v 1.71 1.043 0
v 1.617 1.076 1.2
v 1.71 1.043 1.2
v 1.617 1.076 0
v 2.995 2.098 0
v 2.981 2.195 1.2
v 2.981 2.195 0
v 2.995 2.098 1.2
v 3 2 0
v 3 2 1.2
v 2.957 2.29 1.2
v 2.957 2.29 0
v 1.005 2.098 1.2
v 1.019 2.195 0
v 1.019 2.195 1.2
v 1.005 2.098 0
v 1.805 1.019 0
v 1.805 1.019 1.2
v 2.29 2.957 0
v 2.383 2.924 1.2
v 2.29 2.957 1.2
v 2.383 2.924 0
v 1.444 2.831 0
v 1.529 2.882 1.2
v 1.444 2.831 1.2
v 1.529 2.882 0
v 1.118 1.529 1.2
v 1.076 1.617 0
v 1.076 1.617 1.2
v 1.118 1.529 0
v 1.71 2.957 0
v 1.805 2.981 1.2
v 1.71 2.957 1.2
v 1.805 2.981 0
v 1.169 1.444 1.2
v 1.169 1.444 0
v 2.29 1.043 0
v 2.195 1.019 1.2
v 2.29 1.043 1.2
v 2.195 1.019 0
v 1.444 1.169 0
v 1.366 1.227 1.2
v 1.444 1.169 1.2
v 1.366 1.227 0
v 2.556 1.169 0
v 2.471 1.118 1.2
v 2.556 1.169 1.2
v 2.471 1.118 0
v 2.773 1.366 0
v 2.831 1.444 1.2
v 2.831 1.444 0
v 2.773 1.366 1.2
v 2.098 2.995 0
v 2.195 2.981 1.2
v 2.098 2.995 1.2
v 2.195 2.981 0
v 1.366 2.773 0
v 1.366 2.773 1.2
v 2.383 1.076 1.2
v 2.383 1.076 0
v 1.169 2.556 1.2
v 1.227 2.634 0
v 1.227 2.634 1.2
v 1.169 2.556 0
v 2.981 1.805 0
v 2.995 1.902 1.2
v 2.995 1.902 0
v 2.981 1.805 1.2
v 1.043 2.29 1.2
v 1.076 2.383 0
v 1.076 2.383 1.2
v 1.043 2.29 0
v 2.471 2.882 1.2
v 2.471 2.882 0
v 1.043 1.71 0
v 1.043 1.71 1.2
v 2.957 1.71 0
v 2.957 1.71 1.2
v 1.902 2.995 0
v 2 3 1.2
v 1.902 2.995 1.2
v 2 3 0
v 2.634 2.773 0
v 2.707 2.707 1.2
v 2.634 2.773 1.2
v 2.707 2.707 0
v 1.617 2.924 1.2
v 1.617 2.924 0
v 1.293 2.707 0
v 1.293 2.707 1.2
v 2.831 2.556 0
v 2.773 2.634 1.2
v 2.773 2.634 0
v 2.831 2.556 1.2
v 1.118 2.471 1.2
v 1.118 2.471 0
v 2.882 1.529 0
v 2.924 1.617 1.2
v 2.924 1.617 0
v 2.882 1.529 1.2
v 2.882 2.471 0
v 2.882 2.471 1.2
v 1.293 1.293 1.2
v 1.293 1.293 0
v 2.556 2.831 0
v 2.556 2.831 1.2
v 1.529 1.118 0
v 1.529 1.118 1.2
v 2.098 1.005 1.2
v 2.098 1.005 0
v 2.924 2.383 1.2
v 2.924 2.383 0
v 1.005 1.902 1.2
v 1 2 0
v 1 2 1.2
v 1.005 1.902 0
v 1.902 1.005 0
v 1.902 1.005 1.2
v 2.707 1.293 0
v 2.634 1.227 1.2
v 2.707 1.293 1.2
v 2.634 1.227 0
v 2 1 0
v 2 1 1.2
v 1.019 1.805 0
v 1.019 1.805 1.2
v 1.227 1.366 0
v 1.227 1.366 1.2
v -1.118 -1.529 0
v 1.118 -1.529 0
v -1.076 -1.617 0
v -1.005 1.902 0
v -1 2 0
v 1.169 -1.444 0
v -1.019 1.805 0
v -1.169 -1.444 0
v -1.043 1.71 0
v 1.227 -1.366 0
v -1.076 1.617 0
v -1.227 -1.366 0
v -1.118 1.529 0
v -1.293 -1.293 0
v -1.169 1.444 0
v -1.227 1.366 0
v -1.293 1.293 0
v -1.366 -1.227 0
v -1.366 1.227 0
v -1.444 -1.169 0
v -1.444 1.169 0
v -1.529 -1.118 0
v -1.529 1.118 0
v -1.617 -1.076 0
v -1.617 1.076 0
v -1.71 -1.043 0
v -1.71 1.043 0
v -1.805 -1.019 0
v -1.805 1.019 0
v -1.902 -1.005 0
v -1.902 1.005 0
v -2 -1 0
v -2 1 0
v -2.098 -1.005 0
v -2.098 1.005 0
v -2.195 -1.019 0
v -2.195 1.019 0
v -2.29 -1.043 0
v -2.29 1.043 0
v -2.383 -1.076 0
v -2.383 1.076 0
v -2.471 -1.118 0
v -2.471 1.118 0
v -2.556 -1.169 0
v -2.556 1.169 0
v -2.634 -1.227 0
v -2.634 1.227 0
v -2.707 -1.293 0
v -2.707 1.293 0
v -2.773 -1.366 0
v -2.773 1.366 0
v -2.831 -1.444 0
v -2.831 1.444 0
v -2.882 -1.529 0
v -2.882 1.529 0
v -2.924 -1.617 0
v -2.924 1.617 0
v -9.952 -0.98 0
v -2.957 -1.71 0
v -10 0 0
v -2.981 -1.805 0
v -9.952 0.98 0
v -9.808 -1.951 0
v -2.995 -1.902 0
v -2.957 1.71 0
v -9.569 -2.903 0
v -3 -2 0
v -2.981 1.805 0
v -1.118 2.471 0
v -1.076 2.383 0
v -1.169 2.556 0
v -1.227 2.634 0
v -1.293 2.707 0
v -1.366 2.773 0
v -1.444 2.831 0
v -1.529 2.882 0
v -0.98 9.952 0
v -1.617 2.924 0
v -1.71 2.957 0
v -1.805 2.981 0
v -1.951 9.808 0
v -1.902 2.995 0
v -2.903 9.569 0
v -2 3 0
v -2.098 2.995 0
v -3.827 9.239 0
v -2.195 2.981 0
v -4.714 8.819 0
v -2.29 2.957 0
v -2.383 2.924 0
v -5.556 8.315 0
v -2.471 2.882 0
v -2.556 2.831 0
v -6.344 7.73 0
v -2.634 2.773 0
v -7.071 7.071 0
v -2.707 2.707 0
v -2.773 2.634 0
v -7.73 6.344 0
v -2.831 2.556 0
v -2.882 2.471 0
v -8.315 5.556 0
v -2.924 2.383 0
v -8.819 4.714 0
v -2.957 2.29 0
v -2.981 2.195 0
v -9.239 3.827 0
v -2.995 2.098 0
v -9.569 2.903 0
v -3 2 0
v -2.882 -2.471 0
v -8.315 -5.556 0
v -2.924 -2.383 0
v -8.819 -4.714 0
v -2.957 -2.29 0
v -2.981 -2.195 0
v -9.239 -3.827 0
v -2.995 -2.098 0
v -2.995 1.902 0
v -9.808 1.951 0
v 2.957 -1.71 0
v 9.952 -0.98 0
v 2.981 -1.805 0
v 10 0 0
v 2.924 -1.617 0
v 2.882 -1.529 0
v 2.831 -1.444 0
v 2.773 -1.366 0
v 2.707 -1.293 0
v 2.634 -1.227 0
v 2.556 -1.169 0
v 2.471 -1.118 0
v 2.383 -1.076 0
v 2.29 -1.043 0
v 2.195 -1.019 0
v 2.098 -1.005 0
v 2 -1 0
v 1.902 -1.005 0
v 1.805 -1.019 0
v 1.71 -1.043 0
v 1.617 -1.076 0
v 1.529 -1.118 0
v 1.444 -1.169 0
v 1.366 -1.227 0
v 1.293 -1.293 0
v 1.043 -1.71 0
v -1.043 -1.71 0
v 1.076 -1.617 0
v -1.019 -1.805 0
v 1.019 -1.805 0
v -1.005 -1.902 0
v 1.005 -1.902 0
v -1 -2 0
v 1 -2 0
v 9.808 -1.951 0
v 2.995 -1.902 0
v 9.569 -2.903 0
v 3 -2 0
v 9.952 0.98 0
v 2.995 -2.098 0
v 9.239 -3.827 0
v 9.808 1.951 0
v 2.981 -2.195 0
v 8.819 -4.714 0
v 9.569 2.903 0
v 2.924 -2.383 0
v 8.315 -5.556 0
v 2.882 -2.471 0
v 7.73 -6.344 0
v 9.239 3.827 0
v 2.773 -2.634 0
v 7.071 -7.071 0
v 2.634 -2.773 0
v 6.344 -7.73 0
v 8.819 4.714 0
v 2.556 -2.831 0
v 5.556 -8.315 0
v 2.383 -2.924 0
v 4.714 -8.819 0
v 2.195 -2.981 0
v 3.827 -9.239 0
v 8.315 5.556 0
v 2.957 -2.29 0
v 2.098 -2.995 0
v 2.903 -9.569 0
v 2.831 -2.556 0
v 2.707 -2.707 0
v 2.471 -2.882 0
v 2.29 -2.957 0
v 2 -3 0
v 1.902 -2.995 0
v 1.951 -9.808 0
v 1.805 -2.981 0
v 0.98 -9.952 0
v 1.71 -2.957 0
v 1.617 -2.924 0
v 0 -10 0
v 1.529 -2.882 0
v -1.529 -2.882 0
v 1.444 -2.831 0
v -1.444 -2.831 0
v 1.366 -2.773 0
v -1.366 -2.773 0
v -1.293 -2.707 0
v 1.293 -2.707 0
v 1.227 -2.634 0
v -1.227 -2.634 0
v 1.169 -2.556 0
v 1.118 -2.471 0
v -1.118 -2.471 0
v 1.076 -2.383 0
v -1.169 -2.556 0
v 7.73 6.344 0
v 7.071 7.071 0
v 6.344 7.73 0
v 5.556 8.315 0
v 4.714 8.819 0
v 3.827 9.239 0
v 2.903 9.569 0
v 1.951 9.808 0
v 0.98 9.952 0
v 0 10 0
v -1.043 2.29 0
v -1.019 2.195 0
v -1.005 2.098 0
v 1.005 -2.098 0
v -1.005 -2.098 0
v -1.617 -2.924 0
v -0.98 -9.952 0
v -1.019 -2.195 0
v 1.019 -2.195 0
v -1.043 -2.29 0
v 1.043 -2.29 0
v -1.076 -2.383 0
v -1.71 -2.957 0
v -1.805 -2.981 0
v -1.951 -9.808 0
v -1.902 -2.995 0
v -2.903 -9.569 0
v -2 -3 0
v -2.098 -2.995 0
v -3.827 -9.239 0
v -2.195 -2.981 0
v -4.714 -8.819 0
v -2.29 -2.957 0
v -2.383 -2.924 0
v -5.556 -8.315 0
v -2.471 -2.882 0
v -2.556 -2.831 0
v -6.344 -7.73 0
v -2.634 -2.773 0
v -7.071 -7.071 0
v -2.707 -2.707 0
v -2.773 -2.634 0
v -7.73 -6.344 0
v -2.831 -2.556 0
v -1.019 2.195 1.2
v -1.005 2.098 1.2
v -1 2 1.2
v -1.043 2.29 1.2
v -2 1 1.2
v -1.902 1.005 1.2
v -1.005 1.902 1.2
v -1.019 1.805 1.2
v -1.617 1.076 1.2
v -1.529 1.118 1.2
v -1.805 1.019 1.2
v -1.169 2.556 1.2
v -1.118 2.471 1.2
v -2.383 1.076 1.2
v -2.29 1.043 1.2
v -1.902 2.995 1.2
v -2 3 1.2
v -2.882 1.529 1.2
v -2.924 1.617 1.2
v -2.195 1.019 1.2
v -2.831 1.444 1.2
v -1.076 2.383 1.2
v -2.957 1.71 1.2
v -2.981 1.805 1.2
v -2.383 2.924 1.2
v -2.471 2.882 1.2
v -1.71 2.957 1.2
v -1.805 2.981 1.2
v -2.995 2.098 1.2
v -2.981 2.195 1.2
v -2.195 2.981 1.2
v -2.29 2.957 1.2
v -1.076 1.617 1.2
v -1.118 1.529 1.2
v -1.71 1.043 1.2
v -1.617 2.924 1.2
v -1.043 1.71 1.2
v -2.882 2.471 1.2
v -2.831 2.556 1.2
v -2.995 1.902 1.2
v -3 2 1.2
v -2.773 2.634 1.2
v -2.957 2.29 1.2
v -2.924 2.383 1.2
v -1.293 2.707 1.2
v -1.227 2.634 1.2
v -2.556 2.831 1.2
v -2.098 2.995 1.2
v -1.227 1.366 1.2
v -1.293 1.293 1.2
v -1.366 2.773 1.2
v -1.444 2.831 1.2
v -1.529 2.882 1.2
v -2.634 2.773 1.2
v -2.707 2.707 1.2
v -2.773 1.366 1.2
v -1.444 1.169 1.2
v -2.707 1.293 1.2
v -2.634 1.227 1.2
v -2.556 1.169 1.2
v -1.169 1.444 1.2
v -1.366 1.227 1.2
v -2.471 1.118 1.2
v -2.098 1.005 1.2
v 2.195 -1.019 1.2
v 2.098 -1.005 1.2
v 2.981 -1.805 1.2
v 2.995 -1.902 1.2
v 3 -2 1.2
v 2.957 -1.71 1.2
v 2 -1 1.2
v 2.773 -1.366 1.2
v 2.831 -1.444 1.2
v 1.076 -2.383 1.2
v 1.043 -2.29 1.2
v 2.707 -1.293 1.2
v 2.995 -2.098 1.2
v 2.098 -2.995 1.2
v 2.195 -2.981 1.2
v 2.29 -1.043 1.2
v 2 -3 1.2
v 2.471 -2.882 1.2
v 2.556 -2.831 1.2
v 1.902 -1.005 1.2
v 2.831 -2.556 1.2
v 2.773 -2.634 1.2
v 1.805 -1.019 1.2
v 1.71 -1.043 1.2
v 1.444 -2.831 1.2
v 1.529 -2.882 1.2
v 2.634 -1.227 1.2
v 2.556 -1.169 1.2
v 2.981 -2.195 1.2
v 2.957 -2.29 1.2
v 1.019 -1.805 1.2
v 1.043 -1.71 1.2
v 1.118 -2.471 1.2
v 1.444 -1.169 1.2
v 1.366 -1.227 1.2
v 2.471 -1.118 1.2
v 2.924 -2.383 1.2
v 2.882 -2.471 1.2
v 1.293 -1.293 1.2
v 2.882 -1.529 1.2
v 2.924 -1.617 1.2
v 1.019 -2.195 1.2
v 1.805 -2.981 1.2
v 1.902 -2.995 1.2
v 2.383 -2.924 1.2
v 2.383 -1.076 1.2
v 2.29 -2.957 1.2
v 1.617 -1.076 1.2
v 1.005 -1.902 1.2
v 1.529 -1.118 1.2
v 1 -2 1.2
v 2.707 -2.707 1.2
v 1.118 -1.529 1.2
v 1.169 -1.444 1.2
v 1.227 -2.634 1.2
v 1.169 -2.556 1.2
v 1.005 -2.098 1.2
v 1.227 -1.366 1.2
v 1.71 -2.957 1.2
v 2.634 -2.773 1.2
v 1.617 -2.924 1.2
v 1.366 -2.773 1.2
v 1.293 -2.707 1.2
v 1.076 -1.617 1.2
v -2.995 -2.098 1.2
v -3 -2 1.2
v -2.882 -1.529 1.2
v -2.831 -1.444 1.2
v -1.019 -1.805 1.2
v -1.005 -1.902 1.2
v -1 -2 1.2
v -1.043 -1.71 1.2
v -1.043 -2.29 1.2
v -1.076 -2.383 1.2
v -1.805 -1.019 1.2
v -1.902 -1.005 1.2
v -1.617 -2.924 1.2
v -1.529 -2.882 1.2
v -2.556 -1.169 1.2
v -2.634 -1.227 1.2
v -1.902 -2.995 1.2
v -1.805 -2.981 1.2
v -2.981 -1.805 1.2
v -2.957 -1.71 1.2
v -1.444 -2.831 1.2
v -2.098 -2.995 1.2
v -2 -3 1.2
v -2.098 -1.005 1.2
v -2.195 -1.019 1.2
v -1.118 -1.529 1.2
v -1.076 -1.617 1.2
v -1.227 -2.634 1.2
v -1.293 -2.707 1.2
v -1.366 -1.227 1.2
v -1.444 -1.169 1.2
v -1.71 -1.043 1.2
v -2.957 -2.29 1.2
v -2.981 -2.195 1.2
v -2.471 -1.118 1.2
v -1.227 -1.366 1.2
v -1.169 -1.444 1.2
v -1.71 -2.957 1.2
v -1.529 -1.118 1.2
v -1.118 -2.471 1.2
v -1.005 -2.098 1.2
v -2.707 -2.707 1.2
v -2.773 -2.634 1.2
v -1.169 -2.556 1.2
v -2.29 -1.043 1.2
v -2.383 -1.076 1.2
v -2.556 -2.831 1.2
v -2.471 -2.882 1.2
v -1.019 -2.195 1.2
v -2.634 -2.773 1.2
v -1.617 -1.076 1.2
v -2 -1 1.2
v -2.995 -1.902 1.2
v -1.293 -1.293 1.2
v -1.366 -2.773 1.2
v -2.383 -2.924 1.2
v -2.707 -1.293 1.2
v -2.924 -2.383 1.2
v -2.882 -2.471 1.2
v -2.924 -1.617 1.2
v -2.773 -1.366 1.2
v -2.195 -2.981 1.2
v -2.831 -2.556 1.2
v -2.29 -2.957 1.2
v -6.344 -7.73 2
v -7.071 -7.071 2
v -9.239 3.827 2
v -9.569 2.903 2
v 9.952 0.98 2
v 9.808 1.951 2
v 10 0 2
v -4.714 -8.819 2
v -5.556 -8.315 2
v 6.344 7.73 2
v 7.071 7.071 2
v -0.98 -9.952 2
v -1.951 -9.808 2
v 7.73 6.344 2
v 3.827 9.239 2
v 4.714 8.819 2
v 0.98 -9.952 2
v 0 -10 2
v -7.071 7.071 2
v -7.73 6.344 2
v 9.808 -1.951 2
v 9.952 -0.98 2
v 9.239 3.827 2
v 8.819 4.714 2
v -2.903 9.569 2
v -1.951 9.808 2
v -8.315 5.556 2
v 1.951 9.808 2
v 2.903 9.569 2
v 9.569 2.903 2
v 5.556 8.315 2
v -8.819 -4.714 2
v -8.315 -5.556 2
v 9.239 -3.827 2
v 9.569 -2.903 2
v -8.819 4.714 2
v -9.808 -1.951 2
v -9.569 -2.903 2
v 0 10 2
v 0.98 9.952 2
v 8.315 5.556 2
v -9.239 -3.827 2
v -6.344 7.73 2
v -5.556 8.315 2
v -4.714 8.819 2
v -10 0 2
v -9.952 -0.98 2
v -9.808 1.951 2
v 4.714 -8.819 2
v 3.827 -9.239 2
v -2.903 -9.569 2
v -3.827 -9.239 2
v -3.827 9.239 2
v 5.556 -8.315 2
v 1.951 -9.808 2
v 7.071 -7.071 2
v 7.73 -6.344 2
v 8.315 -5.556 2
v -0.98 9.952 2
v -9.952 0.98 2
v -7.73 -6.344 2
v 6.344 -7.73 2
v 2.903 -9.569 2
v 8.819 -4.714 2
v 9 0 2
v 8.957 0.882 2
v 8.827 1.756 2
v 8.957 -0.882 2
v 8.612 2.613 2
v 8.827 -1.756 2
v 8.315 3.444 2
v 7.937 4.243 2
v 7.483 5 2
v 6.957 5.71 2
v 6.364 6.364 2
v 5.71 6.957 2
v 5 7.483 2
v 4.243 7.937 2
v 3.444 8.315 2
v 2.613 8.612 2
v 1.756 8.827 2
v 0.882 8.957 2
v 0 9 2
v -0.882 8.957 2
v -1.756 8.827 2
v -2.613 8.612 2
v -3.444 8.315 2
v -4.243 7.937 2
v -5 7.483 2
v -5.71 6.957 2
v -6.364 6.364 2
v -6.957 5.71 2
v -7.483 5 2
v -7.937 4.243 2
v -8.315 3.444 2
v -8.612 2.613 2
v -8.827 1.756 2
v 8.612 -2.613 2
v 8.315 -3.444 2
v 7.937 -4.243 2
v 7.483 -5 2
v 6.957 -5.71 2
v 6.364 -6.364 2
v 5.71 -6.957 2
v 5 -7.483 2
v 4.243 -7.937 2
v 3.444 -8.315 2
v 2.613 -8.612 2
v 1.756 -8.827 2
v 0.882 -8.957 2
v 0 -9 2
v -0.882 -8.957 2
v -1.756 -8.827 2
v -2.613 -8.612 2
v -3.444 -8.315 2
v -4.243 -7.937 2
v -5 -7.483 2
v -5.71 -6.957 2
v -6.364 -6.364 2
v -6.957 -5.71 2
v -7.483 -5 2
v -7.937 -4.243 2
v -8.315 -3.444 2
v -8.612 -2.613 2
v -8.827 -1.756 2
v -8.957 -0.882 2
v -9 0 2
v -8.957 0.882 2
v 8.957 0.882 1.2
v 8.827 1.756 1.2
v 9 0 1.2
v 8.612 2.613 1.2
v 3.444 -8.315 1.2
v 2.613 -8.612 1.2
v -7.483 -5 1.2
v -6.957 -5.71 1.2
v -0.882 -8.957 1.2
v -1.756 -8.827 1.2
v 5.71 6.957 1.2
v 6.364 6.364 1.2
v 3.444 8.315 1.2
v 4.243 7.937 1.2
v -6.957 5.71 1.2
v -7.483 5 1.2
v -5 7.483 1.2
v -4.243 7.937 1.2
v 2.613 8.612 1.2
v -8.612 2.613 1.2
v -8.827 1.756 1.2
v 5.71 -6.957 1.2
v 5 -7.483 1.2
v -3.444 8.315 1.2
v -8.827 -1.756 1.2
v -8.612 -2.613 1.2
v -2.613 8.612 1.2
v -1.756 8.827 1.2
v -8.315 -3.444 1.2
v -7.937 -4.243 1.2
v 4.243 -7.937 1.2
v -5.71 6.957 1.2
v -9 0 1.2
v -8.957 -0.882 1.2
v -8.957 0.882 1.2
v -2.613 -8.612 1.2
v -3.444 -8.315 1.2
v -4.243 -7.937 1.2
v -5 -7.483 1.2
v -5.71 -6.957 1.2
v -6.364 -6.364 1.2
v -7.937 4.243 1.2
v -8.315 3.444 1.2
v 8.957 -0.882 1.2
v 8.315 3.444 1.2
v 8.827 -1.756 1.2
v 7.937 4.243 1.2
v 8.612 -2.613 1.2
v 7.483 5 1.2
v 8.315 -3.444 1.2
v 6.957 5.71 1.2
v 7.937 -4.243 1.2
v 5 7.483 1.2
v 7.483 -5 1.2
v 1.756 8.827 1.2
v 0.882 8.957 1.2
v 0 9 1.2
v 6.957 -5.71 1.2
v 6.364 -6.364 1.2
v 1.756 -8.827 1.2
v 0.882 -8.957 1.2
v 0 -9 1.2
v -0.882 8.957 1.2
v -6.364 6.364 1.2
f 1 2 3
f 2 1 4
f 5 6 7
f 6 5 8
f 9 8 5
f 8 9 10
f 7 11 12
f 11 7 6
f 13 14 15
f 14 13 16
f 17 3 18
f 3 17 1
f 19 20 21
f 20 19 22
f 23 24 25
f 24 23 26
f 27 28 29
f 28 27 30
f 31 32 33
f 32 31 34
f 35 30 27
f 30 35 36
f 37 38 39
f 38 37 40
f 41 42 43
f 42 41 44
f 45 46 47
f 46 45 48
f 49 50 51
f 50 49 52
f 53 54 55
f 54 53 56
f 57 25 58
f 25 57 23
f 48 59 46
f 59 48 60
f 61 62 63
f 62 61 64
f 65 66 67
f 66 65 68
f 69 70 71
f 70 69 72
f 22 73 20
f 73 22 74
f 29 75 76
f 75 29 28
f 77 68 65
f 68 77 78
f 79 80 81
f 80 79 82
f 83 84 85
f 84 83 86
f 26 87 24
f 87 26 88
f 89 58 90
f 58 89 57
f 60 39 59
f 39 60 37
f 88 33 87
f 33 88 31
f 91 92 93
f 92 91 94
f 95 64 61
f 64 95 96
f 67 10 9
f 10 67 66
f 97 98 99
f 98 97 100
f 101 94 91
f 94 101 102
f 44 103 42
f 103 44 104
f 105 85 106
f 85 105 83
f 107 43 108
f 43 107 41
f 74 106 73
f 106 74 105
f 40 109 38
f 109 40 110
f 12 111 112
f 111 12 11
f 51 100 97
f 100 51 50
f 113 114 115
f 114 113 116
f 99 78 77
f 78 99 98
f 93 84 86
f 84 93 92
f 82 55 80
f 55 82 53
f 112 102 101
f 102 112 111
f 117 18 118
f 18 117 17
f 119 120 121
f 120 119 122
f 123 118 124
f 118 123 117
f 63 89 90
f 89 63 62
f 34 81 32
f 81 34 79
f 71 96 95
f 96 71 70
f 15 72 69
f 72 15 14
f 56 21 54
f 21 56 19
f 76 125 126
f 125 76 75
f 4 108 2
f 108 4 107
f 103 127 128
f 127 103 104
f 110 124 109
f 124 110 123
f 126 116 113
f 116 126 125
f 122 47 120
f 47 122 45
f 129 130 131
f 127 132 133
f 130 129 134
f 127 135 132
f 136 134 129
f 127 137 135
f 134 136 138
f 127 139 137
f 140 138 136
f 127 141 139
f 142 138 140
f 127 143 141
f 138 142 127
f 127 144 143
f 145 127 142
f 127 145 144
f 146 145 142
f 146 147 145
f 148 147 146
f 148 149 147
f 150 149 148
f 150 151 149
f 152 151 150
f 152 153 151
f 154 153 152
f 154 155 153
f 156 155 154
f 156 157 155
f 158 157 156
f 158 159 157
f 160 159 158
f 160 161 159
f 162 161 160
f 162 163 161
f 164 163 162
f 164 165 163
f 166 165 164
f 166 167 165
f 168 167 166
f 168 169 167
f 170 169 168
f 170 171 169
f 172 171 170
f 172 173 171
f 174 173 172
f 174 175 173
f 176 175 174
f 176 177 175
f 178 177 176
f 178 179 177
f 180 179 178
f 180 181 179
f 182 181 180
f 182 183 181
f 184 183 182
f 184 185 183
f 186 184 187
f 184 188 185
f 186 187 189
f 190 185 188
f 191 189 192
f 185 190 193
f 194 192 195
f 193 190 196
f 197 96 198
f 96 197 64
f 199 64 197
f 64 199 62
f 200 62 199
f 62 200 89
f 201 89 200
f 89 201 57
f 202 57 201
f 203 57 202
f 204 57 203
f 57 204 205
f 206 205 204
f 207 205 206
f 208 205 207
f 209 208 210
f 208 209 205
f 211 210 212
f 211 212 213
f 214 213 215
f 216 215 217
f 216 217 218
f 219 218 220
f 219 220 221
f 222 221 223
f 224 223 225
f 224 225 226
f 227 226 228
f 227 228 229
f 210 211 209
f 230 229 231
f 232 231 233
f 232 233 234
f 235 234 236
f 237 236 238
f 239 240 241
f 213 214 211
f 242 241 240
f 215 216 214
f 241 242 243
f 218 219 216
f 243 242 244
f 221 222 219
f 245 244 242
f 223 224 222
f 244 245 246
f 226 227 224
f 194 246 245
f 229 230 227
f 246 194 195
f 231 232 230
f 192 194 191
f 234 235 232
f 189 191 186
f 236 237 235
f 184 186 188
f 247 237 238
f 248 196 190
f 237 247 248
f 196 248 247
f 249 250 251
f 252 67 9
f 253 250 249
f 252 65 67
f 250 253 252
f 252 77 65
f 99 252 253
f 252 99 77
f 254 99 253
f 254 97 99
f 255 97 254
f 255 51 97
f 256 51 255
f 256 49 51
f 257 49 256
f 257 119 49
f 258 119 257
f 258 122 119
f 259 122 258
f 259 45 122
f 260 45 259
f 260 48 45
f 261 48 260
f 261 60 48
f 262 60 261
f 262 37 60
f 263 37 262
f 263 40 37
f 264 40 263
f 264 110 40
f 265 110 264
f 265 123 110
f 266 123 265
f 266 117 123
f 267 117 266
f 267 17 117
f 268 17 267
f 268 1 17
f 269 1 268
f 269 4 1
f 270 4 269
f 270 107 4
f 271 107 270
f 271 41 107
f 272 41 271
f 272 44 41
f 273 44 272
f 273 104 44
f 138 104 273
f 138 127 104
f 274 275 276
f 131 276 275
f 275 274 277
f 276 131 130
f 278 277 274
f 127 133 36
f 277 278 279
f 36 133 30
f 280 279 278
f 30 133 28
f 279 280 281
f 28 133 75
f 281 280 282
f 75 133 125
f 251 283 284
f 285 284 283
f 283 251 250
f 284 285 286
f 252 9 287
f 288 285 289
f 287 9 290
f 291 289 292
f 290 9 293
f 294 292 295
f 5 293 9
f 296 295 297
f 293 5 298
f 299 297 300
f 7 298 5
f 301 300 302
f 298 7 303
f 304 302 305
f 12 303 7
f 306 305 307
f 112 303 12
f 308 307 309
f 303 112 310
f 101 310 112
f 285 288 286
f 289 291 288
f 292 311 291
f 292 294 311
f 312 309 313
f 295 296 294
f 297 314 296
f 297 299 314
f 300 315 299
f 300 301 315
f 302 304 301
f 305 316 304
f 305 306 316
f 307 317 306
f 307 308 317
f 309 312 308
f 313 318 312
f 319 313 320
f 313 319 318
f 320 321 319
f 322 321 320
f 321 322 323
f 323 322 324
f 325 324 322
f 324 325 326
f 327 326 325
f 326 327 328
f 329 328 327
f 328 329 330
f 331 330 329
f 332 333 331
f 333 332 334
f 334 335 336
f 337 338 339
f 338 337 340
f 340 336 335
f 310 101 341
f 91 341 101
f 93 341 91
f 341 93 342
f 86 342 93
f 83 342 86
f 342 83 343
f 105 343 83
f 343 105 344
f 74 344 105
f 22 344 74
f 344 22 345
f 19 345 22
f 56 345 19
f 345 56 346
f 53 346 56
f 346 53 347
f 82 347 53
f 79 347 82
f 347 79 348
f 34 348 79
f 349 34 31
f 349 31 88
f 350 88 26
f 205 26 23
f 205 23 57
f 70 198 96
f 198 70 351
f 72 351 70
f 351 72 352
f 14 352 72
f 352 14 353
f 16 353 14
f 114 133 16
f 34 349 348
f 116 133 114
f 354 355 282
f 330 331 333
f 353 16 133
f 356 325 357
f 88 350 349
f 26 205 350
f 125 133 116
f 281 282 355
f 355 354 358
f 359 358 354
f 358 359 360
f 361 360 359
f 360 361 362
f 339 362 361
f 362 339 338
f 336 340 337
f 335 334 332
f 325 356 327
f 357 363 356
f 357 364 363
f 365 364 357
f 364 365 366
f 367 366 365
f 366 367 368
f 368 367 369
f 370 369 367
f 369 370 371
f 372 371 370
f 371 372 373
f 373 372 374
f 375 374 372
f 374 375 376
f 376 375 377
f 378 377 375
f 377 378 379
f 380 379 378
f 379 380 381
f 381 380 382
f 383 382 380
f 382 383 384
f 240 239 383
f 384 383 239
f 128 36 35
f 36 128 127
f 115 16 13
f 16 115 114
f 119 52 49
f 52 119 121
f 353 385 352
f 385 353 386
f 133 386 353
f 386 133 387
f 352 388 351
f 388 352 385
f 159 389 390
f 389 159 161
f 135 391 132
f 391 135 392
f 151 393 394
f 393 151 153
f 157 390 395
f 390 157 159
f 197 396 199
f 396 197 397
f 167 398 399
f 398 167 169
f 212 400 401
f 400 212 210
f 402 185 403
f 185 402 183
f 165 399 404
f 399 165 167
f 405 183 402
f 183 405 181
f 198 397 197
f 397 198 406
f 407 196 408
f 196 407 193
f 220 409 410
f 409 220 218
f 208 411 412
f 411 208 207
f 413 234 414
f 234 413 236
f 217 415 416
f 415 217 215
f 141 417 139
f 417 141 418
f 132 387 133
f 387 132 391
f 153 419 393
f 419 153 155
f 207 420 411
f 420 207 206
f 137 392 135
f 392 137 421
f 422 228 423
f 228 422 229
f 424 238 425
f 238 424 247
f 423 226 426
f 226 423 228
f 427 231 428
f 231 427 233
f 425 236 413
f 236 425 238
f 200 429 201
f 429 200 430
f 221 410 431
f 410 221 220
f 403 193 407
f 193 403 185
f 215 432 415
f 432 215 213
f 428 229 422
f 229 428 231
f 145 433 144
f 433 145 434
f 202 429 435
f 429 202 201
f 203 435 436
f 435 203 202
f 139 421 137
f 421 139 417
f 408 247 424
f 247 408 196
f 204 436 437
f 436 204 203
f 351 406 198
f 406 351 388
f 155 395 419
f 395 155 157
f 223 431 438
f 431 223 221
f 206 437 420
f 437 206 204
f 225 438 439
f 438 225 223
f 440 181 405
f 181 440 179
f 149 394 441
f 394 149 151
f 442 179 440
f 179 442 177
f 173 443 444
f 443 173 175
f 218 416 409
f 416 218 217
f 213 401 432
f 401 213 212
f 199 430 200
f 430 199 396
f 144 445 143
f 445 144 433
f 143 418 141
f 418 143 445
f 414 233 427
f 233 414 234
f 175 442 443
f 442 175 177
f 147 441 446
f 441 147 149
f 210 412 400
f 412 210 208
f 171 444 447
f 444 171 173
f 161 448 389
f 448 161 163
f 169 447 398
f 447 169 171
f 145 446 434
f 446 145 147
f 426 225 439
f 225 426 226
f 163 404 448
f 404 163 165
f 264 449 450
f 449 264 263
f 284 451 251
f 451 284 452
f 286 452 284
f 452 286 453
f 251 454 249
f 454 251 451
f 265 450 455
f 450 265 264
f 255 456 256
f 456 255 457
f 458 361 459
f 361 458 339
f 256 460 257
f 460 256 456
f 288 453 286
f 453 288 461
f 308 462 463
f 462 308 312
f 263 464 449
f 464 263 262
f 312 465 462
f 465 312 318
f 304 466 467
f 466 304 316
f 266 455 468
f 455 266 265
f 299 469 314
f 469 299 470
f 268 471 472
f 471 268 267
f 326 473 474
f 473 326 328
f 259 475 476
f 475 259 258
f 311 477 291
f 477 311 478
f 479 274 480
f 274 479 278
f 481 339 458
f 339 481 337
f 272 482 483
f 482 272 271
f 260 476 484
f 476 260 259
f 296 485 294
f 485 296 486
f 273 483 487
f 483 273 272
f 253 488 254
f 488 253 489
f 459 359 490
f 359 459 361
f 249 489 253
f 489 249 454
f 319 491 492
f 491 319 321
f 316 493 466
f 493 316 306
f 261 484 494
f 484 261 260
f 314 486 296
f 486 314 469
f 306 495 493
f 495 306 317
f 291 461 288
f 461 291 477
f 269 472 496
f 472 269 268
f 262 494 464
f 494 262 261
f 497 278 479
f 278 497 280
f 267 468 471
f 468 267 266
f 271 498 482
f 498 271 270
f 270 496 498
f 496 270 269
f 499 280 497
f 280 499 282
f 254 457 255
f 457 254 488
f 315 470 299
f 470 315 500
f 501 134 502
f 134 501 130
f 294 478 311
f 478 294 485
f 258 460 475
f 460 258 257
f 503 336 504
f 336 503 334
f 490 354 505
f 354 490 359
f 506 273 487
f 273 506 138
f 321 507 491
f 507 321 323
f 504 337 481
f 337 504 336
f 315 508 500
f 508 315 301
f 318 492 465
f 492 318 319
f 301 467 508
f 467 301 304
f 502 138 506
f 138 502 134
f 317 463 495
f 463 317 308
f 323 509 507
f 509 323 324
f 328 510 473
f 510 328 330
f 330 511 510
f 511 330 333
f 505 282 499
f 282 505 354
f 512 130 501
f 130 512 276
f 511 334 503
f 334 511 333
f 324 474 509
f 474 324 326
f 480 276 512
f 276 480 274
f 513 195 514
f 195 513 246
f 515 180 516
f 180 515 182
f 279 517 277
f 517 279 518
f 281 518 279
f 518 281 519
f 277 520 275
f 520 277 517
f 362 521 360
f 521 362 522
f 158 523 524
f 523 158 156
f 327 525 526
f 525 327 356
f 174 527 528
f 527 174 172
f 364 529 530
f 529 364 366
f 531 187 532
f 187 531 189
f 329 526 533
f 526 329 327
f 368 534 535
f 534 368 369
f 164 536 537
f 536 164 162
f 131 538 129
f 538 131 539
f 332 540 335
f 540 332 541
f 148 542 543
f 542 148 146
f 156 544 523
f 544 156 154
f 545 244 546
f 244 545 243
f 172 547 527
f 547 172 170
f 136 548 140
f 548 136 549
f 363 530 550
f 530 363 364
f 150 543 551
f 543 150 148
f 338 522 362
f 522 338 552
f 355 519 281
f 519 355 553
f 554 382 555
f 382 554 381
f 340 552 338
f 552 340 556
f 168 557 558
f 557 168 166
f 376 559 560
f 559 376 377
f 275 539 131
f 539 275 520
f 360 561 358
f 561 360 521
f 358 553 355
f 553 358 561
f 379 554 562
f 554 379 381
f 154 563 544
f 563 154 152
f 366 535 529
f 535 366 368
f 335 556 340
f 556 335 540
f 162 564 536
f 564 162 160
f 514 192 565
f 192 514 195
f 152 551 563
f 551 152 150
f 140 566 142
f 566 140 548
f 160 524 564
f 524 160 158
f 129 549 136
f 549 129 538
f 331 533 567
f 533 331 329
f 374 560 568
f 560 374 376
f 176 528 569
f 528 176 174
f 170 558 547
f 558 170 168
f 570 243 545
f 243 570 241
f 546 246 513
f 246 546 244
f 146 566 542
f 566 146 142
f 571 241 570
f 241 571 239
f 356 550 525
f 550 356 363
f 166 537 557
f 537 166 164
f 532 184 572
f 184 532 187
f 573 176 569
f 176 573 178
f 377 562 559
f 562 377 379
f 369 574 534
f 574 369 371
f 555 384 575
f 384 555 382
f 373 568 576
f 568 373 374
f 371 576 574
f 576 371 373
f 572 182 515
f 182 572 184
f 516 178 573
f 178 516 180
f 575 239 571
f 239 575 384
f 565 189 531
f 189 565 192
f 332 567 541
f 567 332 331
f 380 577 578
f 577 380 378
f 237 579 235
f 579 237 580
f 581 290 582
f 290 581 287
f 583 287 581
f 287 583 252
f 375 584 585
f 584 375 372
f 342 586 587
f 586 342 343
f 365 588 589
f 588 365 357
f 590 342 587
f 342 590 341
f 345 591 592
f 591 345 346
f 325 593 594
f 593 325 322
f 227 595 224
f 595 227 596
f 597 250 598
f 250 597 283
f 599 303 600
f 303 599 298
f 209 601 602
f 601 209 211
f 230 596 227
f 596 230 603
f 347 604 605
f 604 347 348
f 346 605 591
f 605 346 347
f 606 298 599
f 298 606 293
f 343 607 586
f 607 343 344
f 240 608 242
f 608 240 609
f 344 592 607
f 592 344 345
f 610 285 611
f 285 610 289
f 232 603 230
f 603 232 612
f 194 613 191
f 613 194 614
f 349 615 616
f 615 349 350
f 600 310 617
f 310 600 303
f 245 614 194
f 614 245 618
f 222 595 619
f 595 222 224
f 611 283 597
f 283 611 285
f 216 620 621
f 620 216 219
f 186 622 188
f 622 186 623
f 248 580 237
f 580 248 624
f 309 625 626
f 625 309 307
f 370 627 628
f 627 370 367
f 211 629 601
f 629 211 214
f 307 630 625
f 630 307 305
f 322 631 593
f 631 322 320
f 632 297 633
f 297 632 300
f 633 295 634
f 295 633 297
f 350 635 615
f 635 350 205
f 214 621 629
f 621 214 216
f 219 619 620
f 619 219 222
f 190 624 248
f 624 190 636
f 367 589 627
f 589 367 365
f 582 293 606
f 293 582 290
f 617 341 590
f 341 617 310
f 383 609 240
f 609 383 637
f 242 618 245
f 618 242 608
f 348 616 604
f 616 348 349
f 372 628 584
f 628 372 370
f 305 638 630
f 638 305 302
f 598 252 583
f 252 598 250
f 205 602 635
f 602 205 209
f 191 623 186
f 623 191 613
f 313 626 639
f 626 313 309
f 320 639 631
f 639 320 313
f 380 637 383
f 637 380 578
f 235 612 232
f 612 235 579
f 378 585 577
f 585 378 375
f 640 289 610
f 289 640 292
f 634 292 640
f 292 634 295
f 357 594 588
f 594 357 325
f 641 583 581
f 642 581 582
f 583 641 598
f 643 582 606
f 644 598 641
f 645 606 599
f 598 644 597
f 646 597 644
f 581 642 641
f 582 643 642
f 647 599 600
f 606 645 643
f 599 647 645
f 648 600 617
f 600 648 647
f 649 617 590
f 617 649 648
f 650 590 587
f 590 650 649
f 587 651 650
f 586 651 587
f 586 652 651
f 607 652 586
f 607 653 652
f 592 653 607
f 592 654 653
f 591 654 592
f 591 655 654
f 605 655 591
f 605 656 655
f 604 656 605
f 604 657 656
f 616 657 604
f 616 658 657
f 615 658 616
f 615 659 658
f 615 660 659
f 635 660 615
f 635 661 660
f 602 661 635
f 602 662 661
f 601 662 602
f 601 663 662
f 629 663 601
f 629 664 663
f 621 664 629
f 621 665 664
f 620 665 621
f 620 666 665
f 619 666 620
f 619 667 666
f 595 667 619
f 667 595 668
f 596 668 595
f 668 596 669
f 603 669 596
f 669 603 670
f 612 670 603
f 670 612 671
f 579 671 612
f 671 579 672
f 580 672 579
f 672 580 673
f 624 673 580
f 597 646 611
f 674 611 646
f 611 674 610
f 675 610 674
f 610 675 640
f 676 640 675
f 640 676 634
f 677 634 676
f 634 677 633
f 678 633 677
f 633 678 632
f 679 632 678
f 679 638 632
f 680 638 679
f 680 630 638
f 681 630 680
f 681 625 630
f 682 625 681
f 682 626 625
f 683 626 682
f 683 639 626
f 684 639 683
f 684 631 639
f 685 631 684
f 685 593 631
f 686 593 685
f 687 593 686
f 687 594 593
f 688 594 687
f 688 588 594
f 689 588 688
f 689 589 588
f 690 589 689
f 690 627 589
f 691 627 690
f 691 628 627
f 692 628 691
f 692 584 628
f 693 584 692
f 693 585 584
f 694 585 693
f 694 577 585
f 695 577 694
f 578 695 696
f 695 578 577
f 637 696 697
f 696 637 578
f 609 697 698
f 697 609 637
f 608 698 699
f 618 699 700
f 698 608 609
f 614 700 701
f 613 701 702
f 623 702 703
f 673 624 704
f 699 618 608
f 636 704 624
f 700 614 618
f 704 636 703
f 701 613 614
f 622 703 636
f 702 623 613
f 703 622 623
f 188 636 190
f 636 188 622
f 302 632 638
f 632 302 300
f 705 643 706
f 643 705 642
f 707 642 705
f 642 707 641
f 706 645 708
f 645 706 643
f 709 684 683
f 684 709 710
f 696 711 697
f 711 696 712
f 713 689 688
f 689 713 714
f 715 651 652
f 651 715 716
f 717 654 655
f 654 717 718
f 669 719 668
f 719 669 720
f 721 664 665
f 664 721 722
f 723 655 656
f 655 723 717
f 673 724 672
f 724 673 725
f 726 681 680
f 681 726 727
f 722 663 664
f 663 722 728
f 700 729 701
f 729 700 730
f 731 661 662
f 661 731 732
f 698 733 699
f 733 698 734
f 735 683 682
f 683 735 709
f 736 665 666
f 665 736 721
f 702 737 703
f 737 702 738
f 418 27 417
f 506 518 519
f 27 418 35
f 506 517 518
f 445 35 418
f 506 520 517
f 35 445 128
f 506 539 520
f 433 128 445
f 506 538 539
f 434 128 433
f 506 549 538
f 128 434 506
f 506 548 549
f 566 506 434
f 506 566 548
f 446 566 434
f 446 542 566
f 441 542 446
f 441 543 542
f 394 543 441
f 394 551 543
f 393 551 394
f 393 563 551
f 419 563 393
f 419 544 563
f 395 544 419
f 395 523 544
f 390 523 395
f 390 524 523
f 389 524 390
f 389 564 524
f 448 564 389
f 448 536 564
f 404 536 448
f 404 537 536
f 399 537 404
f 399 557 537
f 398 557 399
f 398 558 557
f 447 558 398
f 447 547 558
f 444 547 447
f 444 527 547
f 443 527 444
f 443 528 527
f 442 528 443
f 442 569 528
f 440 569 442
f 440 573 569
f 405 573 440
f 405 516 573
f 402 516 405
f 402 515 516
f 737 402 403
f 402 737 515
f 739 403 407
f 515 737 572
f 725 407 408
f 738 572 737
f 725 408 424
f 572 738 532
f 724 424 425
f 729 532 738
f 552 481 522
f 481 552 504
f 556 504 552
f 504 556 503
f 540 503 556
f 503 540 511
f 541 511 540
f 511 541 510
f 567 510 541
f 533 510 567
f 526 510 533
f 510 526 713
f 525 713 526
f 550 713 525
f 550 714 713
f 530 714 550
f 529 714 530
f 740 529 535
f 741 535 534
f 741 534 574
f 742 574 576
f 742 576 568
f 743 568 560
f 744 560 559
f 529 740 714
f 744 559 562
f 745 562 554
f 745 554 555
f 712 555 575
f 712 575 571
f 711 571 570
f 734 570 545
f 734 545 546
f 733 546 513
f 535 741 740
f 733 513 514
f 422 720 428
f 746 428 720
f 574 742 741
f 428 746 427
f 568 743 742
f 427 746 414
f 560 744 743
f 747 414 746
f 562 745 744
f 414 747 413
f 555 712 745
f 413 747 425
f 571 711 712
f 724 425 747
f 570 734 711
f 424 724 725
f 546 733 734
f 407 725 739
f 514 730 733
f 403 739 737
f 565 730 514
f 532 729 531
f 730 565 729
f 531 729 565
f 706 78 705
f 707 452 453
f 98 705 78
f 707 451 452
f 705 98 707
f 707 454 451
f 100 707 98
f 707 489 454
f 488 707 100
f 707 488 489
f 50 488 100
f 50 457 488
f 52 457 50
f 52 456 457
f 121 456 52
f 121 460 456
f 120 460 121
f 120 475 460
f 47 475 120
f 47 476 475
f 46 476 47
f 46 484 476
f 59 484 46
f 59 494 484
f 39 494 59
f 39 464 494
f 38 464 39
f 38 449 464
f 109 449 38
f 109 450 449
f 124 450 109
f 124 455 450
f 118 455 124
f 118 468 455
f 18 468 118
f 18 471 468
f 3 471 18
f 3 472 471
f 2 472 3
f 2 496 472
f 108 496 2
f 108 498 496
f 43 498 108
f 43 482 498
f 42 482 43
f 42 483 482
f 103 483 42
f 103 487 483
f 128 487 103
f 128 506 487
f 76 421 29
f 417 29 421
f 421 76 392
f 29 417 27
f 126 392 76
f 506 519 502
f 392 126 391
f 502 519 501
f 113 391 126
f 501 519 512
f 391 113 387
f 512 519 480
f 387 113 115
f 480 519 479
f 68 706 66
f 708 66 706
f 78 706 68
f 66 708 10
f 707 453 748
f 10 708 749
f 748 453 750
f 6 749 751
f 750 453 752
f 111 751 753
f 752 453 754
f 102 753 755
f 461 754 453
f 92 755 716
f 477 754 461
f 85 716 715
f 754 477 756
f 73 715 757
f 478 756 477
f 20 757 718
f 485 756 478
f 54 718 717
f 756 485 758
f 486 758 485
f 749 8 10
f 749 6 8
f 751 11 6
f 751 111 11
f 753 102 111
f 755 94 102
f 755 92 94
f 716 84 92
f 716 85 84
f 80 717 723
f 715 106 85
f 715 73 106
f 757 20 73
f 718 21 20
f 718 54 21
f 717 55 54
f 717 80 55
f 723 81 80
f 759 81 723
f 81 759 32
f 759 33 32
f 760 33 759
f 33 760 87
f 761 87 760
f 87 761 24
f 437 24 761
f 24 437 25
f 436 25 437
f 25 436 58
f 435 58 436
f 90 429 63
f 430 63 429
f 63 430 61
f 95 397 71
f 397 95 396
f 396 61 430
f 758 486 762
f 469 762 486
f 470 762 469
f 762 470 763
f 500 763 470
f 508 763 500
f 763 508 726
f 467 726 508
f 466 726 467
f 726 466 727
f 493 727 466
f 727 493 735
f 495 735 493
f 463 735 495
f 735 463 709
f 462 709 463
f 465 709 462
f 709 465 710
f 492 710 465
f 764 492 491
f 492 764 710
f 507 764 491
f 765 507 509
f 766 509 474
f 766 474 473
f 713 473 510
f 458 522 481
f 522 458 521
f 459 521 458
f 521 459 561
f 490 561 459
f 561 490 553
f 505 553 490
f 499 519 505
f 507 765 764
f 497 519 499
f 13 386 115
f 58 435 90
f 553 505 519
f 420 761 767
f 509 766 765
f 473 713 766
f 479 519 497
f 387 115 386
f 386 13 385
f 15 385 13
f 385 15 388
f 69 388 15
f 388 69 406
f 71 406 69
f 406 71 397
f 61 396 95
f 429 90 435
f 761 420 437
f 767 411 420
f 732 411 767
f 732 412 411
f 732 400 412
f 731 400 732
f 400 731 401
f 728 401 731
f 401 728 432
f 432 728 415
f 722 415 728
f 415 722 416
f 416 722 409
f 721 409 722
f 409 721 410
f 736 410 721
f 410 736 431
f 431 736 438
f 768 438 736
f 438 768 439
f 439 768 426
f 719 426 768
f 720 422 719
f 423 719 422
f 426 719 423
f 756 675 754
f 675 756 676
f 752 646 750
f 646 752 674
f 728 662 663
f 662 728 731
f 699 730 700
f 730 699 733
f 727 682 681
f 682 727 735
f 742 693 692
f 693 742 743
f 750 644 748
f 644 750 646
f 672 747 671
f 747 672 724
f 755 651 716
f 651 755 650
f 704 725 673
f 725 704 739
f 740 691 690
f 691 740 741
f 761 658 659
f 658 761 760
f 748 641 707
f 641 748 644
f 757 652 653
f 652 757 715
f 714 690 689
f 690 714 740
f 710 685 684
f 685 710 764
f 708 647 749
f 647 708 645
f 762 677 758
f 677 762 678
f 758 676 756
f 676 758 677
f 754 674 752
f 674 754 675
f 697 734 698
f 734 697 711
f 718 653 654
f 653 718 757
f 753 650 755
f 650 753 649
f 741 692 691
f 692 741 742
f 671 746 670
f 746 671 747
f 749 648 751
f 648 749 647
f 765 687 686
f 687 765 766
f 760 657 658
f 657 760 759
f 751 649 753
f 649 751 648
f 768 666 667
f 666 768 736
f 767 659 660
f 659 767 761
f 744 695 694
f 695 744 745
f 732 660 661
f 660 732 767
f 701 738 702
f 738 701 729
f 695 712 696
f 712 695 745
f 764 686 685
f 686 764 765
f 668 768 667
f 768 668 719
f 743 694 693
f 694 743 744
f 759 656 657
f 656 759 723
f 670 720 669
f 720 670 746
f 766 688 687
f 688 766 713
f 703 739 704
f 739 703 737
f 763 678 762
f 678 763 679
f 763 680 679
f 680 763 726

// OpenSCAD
// [FL_INDEX: keywords="openscad, 3d_parametric, Customizable_Button, csg_solid" | COT="Parametric OpenSCAD design from 3DCodeverse"]
// Title: Customizable Button

$fn = 64*1;

diameter = 20; //[5:50]
height = 2; //[1:25]
number_of_holes = 4; //[1:5]
hole_diameter = 2; //[1:10]
hole_offset = 2; //[0:10]
lip_ratio = 60; //[0:100]
edge_ratio = 90; //[0:100]

main();

module main(){
	difference(){
		cylinder(h = height, r = diameter/2); 
		if (number_of_holes == 1) {
			oneHole();
		} else if (number_of_holes == 2) {
			twoHoles();
		} else if (number_of_holes == 3) {
			threeHoles();
		} else if (number_of_holes == 4){
			fourHoles();
		} else {
			fiveHoles();
		}
		translate(v=[0,0,height*lip_ratio*.01])
		cylinder(h = 25, r = diameter/2*edge_ratio*.01);
	}
}

module oneHole() {
	cylinder(h=25, r = hole_diameter/2);
}

module twoHoles() {
	translate(v=[hole_offset, 0, 0])
	cylinder(h = 25, r = hole_diameter/2);
	translate(v=[-hole_offset, 0, 0])
	cylinder(h = 25, r = hole_diameter/2);	
}

module threeHoles() {
	translate(v=[0, hole_offset, 0])
	cylinder(h = 25, r = hole_diameter/2);
	translate(v=[.87*hole_offset, -.5*hole_offset, 0])
	cylinder(h = 25, r = hole_diameter/2);
	translate(v=[-.87*hole_offset, -.5*hole_offset, 0])
	cylinder(h = 25, r = hole_diameter/2);	
}

module fourHoles() {
	translate(v=[hole_offset, hole_offset, 0])
	cylinder(h = 25, r = hole_diameter/2);
	translate(v=[-hole_offset, hole_offset, 0])
	cylinder(h = 25, r = hole_diameter/2);	
	translate(v=[hole_offset, -hole_offset, 0])
	cylinder(h = 25, r = hole_diameter/2);
	translate(v=[-hole_offset,-hole_offset,0])
	cylinder(h = 25, r = hole_diameter/2);
}

module fiveHoles() {
	translate(v=[0, hole_offset, 0])
	cylinder(h = 25, r = hole_diameter/2);
	translate(v=[hole_offset*.95, hole_offset*.31, 0])
	cylinder(h = 25, r = hole_diameter/2);	
	translate(v=[hole_offset*.59, -hole_offset*.81, 0])
	cylinder(h = 25, r = hole_diameter/2);
	translate(v=[-hole_offset*.59,-hole_offset*.81,0])
	cylinder(h = 25, r = hole_diameter/2);
	translate(v=[-hole_offset*.95,hole_offset*.31,0])
	cylinder(h = 25, r = hole_diameter/2);
}
